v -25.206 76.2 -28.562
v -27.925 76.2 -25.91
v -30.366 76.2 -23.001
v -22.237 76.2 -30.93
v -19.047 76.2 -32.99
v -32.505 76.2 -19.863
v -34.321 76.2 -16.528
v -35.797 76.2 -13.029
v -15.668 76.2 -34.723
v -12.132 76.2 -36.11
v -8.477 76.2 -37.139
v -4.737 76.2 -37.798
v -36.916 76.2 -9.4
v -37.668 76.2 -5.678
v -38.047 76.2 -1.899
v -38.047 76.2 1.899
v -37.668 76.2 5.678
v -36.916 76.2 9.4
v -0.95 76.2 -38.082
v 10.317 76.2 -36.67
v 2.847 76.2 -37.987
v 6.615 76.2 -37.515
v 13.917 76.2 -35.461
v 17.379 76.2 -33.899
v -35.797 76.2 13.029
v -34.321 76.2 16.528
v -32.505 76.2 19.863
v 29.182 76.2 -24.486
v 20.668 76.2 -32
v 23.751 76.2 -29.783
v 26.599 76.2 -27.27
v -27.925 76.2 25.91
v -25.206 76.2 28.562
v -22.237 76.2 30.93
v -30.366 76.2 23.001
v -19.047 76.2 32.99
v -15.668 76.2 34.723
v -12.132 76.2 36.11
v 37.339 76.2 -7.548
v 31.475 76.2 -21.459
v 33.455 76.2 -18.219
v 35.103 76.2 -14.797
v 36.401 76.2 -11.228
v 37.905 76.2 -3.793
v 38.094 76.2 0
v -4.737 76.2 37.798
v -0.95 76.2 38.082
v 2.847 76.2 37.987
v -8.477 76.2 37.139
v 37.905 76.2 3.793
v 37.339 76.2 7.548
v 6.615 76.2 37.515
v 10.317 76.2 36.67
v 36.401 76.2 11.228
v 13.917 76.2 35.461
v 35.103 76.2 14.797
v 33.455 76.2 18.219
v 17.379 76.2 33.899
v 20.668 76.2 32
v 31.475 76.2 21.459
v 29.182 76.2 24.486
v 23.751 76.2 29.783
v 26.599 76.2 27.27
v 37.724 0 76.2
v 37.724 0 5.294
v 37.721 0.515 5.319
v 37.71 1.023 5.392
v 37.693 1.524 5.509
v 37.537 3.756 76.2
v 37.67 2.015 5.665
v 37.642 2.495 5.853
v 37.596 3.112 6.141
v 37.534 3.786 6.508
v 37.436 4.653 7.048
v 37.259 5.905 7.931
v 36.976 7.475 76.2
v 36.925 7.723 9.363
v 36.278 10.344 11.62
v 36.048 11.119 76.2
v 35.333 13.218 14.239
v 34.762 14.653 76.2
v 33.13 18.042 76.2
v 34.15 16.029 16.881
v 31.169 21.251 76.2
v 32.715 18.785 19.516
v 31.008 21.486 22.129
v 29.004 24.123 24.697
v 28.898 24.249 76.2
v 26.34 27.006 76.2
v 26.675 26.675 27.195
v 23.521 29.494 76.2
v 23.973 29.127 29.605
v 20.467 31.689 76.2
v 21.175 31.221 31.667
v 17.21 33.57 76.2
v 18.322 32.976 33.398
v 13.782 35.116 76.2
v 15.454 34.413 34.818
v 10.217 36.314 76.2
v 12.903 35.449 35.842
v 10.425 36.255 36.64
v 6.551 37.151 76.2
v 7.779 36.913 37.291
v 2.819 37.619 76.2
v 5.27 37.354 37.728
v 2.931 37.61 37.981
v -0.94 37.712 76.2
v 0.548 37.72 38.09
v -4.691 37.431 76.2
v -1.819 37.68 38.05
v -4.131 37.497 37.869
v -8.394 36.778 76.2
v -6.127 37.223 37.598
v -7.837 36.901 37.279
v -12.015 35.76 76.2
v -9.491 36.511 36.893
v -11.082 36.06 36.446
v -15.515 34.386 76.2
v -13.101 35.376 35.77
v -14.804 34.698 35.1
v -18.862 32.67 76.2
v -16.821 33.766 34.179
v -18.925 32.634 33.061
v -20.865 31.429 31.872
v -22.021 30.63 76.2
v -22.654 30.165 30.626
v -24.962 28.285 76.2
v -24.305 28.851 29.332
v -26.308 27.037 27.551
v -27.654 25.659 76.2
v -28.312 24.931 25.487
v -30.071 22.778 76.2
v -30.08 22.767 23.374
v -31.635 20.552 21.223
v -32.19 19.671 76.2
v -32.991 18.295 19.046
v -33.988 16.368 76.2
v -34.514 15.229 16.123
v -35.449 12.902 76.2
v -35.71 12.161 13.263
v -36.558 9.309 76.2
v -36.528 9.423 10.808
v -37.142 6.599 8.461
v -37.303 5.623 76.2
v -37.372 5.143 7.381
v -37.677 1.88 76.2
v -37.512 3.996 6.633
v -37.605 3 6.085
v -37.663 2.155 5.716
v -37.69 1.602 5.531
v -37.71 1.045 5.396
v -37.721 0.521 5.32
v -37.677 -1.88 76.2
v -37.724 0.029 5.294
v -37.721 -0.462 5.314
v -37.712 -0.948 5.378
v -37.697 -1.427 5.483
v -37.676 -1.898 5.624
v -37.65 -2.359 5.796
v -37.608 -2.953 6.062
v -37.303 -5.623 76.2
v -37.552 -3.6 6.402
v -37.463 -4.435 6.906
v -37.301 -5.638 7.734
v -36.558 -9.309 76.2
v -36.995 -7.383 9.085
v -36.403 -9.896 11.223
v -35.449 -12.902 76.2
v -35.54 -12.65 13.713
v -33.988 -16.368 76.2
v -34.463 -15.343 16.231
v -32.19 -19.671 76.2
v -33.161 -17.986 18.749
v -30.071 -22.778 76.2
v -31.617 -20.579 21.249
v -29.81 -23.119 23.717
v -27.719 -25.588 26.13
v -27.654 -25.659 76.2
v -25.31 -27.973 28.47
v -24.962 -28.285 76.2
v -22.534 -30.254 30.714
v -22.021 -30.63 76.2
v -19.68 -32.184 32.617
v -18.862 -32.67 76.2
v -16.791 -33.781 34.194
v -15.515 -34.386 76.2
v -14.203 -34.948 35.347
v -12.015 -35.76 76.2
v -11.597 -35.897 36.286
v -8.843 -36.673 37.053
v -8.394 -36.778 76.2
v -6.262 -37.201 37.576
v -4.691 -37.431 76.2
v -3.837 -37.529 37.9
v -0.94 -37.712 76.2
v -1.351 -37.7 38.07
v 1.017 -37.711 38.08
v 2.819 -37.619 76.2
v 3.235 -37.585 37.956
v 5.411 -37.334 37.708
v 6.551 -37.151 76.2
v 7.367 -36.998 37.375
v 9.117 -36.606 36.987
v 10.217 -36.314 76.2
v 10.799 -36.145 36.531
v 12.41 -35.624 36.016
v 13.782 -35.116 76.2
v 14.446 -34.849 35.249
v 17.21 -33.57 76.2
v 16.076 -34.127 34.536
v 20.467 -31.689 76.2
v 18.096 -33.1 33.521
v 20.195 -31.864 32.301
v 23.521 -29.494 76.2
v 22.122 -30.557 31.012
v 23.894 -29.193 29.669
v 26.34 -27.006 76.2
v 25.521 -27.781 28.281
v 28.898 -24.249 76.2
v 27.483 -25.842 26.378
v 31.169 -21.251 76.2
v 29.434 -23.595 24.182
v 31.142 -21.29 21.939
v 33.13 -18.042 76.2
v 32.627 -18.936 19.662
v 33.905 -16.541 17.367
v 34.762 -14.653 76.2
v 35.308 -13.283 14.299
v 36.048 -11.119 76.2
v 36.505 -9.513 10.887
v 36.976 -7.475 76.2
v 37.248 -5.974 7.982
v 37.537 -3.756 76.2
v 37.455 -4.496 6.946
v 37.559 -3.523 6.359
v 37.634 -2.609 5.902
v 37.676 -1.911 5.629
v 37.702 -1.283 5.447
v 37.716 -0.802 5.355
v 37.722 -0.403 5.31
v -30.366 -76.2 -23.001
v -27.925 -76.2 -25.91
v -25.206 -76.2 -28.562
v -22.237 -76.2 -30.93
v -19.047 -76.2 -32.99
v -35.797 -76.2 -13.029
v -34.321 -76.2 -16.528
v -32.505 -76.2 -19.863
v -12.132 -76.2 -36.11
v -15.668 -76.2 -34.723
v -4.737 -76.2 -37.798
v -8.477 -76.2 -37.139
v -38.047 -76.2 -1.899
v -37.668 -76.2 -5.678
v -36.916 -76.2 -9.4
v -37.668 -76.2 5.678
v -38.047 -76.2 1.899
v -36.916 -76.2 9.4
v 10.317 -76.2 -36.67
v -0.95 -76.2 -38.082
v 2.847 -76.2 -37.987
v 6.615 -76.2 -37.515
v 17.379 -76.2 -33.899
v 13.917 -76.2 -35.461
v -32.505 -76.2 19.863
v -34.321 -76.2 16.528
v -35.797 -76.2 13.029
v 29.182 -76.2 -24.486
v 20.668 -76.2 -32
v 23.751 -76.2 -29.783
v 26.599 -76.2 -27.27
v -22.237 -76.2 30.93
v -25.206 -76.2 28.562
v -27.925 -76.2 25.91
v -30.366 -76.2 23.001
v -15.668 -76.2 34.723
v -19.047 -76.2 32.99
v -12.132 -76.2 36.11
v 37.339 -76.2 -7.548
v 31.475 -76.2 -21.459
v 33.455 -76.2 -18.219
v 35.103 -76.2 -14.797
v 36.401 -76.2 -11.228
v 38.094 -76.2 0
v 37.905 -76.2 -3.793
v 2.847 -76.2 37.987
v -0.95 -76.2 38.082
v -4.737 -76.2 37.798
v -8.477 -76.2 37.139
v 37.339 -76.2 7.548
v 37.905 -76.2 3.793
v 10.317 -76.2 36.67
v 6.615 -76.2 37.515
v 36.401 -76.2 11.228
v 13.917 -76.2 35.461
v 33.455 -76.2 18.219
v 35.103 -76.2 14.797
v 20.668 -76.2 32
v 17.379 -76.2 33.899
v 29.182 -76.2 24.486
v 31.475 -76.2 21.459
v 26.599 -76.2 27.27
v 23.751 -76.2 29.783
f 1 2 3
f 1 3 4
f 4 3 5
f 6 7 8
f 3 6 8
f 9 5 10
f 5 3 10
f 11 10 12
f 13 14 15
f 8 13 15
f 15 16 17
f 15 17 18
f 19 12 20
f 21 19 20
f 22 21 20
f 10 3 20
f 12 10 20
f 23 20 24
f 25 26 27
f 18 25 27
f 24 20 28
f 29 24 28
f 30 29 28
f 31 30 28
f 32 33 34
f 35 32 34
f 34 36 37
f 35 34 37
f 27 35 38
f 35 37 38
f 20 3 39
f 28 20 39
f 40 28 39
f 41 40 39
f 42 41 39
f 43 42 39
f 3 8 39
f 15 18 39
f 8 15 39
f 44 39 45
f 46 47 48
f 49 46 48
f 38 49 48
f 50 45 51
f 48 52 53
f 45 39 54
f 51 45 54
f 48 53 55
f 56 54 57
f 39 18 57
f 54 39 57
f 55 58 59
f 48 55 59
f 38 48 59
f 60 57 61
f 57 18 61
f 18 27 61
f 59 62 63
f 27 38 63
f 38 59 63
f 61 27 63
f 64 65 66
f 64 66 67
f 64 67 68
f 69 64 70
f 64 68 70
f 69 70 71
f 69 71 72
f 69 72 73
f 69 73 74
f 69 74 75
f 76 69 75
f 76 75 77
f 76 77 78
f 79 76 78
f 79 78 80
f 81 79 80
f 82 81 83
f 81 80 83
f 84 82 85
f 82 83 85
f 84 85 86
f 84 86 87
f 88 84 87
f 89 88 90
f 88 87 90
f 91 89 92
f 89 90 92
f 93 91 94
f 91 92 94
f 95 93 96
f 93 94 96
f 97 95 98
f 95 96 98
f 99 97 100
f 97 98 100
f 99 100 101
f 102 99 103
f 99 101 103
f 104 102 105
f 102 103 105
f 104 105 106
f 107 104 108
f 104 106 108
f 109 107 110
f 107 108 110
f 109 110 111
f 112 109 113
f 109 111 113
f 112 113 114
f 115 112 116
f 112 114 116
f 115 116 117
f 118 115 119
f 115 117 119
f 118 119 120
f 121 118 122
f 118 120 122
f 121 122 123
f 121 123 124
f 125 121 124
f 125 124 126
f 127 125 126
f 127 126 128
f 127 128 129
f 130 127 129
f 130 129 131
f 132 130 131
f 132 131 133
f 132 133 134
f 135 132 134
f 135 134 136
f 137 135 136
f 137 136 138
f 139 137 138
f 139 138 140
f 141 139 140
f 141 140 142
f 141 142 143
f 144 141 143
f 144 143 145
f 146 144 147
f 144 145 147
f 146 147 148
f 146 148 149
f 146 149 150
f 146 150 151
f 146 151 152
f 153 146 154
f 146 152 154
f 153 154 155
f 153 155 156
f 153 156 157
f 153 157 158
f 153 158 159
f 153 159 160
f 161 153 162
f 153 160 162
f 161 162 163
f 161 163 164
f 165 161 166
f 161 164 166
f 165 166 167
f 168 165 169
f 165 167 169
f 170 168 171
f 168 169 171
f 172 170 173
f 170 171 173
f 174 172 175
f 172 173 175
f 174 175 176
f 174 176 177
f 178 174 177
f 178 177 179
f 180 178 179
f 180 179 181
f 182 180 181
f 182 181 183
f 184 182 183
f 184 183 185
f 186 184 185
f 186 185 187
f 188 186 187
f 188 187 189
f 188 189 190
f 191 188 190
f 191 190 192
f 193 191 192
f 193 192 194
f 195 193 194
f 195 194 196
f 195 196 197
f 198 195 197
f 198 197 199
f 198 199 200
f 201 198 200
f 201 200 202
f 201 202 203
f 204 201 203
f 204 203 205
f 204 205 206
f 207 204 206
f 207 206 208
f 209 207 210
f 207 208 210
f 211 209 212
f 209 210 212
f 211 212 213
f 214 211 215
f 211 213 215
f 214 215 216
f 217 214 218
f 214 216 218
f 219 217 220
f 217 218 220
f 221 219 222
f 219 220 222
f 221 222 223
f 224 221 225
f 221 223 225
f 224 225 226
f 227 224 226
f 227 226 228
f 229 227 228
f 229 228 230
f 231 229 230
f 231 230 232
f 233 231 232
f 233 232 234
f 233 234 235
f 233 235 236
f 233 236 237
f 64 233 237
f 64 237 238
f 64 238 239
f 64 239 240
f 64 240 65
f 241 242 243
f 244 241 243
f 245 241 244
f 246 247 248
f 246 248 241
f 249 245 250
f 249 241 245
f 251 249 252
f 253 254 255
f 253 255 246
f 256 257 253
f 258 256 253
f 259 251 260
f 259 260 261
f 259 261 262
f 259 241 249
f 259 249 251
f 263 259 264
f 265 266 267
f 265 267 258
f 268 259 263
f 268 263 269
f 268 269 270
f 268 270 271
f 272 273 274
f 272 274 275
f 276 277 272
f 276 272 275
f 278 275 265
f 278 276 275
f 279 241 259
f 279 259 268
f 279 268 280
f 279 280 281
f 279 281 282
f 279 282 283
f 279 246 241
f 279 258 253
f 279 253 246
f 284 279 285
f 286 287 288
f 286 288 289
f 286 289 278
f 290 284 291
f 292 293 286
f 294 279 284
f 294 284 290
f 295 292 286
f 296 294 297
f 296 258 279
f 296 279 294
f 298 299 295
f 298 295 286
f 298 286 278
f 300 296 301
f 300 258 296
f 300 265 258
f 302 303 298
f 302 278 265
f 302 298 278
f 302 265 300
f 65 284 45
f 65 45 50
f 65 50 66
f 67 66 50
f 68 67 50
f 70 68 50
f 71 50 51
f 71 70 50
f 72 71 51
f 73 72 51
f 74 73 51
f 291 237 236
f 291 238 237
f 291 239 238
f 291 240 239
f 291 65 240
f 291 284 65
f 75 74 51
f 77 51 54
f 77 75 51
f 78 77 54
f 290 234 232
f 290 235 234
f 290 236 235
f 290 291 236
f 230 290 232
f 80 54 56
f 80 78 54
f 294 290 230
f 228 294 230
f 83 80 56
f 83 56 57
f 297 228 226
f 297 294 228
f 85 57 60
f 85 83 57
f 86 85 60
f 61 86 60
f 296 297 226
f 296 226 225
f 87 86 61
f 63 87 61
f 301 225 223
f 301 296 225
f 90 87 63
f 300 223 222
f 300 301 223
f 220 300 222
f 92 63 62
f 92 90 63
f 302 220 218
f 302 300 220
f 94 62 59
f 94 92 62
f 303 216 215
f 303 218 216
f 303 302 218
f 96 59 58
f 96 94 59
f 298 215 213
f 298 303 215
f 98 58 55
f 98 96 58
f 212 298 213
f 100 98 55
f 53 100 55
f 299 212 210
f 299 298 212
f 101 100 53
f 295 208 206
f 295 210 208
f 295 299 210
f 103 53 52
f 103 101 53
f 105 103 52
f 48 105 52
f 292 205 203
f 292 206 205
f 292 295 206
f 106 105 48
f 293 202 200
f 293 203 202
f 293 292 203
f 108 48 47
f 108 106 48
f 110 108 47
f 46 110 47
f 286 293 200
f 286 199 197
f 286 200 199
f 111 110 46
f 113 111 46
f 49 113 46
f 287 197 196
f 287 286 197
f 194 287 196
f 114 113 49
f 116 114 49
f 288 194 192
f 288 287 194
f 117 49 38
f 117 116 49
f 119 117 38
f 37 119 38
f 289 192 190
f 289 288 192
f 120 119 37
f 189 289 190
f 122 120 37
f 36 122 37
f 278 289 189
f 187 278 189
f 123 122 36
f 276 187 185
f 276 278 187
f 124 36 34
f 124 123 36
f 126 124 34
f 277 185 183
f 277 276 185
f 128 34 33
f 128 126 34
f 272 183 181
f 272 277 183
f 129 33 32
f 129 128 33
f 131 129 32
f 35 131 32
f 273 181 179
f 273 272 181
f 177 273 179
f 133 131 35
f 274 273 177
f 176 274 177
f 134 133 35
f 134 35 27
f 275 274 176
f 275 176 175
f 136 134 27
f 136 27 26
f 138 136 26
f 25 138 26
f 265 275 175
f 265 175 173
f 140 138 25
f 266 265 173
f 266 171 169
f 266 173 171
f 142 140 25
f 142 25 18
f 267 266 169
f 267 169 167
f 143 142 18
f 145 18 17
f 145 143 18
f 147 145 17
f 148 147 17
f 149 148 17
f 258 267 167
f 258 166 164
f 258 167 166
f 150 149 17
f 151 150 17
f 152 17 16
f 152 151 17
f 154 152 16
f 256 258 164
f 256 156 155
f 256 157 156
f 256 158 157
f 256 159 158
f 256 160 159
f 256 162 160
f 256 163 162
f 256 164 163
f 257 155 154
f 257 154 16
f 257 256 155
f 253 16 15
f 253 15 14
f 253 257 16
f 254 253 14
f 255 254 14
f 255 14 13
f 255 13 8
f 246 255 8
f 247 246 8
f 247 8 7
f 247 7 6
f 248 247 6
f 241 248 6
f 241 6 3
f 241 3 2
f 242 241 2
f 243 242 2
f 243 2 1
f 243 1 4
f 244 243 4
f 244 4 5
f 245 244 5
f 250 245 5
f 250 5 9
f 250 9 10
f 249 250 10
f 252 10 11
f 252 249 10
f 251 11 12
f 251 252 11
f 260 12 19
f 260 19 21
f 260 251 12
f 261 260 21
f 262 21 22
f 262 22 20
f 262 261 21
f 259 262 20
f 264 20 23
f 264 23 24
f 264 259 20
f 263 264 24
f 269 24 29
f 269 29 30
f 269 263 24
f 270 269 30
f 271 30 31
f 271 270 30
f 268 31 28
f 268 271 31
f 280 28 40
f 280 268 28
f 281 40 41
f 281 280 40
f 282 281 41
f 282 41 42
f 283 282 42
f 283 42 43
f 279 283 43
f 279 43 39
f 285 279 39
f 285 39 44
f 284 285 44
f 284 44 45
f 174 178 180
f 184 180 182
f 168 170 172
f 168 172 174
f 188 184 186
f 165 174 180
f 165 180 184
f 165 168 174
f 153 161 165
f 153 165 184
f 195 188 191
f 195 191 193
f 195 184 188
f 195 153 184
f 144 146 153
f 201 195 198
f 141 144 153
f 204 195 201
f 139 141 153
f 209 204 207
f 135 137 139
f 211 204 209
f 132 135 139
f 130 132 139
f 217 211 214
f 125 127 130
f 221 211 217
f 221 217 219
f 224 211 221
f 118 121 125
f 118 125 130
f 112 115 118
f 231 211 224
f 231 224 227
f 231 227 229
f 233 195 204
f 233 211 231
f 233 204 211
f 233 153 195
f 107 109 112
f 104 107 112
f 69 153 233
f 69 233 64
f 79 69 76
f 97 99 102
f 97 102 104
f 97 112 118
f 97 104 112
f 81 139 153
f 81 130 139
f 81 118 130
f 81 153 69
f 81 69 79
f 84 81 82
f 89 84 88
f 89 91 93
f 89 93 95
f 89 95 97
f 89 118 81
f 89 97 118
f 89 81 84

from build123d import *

# Parameters (mm, degrees)
F0_R      = 38.093898
F1_DEPTH  = 76.2
F1_FACE_R = 38.093898
F2_DEPTH  = 76.2
F3_R      = 37.724218
F4_DEPTH  = 76.2


with BuildPart() as f1:
    # F0 (on Front) → F1 (new body)
    with BuildSketch(Plane.XZ):
        Circle(F0_R)
    extrude(amount=F1_DEPTH)

    # F0 (on Front) + F1_face (on face) → F2 (join)
    with BuildSketch(Plane.XZ):
        Circle(F0_R)
    with BuildSketch(Plane(origin=(0, 0, 0), x_dir=(1, 0, 0), z_dir=(0, 1, 0))):
        Circle(F1_FACE_R)
    extrude(amount=-F2_DEPTH)

    # F3 (on Top) → F4 (join)
    with BuildSketch(Plane.XY):
        Circle(F3_R)
    extrude(amount=F4_DEPTH)


solid = f1.part
